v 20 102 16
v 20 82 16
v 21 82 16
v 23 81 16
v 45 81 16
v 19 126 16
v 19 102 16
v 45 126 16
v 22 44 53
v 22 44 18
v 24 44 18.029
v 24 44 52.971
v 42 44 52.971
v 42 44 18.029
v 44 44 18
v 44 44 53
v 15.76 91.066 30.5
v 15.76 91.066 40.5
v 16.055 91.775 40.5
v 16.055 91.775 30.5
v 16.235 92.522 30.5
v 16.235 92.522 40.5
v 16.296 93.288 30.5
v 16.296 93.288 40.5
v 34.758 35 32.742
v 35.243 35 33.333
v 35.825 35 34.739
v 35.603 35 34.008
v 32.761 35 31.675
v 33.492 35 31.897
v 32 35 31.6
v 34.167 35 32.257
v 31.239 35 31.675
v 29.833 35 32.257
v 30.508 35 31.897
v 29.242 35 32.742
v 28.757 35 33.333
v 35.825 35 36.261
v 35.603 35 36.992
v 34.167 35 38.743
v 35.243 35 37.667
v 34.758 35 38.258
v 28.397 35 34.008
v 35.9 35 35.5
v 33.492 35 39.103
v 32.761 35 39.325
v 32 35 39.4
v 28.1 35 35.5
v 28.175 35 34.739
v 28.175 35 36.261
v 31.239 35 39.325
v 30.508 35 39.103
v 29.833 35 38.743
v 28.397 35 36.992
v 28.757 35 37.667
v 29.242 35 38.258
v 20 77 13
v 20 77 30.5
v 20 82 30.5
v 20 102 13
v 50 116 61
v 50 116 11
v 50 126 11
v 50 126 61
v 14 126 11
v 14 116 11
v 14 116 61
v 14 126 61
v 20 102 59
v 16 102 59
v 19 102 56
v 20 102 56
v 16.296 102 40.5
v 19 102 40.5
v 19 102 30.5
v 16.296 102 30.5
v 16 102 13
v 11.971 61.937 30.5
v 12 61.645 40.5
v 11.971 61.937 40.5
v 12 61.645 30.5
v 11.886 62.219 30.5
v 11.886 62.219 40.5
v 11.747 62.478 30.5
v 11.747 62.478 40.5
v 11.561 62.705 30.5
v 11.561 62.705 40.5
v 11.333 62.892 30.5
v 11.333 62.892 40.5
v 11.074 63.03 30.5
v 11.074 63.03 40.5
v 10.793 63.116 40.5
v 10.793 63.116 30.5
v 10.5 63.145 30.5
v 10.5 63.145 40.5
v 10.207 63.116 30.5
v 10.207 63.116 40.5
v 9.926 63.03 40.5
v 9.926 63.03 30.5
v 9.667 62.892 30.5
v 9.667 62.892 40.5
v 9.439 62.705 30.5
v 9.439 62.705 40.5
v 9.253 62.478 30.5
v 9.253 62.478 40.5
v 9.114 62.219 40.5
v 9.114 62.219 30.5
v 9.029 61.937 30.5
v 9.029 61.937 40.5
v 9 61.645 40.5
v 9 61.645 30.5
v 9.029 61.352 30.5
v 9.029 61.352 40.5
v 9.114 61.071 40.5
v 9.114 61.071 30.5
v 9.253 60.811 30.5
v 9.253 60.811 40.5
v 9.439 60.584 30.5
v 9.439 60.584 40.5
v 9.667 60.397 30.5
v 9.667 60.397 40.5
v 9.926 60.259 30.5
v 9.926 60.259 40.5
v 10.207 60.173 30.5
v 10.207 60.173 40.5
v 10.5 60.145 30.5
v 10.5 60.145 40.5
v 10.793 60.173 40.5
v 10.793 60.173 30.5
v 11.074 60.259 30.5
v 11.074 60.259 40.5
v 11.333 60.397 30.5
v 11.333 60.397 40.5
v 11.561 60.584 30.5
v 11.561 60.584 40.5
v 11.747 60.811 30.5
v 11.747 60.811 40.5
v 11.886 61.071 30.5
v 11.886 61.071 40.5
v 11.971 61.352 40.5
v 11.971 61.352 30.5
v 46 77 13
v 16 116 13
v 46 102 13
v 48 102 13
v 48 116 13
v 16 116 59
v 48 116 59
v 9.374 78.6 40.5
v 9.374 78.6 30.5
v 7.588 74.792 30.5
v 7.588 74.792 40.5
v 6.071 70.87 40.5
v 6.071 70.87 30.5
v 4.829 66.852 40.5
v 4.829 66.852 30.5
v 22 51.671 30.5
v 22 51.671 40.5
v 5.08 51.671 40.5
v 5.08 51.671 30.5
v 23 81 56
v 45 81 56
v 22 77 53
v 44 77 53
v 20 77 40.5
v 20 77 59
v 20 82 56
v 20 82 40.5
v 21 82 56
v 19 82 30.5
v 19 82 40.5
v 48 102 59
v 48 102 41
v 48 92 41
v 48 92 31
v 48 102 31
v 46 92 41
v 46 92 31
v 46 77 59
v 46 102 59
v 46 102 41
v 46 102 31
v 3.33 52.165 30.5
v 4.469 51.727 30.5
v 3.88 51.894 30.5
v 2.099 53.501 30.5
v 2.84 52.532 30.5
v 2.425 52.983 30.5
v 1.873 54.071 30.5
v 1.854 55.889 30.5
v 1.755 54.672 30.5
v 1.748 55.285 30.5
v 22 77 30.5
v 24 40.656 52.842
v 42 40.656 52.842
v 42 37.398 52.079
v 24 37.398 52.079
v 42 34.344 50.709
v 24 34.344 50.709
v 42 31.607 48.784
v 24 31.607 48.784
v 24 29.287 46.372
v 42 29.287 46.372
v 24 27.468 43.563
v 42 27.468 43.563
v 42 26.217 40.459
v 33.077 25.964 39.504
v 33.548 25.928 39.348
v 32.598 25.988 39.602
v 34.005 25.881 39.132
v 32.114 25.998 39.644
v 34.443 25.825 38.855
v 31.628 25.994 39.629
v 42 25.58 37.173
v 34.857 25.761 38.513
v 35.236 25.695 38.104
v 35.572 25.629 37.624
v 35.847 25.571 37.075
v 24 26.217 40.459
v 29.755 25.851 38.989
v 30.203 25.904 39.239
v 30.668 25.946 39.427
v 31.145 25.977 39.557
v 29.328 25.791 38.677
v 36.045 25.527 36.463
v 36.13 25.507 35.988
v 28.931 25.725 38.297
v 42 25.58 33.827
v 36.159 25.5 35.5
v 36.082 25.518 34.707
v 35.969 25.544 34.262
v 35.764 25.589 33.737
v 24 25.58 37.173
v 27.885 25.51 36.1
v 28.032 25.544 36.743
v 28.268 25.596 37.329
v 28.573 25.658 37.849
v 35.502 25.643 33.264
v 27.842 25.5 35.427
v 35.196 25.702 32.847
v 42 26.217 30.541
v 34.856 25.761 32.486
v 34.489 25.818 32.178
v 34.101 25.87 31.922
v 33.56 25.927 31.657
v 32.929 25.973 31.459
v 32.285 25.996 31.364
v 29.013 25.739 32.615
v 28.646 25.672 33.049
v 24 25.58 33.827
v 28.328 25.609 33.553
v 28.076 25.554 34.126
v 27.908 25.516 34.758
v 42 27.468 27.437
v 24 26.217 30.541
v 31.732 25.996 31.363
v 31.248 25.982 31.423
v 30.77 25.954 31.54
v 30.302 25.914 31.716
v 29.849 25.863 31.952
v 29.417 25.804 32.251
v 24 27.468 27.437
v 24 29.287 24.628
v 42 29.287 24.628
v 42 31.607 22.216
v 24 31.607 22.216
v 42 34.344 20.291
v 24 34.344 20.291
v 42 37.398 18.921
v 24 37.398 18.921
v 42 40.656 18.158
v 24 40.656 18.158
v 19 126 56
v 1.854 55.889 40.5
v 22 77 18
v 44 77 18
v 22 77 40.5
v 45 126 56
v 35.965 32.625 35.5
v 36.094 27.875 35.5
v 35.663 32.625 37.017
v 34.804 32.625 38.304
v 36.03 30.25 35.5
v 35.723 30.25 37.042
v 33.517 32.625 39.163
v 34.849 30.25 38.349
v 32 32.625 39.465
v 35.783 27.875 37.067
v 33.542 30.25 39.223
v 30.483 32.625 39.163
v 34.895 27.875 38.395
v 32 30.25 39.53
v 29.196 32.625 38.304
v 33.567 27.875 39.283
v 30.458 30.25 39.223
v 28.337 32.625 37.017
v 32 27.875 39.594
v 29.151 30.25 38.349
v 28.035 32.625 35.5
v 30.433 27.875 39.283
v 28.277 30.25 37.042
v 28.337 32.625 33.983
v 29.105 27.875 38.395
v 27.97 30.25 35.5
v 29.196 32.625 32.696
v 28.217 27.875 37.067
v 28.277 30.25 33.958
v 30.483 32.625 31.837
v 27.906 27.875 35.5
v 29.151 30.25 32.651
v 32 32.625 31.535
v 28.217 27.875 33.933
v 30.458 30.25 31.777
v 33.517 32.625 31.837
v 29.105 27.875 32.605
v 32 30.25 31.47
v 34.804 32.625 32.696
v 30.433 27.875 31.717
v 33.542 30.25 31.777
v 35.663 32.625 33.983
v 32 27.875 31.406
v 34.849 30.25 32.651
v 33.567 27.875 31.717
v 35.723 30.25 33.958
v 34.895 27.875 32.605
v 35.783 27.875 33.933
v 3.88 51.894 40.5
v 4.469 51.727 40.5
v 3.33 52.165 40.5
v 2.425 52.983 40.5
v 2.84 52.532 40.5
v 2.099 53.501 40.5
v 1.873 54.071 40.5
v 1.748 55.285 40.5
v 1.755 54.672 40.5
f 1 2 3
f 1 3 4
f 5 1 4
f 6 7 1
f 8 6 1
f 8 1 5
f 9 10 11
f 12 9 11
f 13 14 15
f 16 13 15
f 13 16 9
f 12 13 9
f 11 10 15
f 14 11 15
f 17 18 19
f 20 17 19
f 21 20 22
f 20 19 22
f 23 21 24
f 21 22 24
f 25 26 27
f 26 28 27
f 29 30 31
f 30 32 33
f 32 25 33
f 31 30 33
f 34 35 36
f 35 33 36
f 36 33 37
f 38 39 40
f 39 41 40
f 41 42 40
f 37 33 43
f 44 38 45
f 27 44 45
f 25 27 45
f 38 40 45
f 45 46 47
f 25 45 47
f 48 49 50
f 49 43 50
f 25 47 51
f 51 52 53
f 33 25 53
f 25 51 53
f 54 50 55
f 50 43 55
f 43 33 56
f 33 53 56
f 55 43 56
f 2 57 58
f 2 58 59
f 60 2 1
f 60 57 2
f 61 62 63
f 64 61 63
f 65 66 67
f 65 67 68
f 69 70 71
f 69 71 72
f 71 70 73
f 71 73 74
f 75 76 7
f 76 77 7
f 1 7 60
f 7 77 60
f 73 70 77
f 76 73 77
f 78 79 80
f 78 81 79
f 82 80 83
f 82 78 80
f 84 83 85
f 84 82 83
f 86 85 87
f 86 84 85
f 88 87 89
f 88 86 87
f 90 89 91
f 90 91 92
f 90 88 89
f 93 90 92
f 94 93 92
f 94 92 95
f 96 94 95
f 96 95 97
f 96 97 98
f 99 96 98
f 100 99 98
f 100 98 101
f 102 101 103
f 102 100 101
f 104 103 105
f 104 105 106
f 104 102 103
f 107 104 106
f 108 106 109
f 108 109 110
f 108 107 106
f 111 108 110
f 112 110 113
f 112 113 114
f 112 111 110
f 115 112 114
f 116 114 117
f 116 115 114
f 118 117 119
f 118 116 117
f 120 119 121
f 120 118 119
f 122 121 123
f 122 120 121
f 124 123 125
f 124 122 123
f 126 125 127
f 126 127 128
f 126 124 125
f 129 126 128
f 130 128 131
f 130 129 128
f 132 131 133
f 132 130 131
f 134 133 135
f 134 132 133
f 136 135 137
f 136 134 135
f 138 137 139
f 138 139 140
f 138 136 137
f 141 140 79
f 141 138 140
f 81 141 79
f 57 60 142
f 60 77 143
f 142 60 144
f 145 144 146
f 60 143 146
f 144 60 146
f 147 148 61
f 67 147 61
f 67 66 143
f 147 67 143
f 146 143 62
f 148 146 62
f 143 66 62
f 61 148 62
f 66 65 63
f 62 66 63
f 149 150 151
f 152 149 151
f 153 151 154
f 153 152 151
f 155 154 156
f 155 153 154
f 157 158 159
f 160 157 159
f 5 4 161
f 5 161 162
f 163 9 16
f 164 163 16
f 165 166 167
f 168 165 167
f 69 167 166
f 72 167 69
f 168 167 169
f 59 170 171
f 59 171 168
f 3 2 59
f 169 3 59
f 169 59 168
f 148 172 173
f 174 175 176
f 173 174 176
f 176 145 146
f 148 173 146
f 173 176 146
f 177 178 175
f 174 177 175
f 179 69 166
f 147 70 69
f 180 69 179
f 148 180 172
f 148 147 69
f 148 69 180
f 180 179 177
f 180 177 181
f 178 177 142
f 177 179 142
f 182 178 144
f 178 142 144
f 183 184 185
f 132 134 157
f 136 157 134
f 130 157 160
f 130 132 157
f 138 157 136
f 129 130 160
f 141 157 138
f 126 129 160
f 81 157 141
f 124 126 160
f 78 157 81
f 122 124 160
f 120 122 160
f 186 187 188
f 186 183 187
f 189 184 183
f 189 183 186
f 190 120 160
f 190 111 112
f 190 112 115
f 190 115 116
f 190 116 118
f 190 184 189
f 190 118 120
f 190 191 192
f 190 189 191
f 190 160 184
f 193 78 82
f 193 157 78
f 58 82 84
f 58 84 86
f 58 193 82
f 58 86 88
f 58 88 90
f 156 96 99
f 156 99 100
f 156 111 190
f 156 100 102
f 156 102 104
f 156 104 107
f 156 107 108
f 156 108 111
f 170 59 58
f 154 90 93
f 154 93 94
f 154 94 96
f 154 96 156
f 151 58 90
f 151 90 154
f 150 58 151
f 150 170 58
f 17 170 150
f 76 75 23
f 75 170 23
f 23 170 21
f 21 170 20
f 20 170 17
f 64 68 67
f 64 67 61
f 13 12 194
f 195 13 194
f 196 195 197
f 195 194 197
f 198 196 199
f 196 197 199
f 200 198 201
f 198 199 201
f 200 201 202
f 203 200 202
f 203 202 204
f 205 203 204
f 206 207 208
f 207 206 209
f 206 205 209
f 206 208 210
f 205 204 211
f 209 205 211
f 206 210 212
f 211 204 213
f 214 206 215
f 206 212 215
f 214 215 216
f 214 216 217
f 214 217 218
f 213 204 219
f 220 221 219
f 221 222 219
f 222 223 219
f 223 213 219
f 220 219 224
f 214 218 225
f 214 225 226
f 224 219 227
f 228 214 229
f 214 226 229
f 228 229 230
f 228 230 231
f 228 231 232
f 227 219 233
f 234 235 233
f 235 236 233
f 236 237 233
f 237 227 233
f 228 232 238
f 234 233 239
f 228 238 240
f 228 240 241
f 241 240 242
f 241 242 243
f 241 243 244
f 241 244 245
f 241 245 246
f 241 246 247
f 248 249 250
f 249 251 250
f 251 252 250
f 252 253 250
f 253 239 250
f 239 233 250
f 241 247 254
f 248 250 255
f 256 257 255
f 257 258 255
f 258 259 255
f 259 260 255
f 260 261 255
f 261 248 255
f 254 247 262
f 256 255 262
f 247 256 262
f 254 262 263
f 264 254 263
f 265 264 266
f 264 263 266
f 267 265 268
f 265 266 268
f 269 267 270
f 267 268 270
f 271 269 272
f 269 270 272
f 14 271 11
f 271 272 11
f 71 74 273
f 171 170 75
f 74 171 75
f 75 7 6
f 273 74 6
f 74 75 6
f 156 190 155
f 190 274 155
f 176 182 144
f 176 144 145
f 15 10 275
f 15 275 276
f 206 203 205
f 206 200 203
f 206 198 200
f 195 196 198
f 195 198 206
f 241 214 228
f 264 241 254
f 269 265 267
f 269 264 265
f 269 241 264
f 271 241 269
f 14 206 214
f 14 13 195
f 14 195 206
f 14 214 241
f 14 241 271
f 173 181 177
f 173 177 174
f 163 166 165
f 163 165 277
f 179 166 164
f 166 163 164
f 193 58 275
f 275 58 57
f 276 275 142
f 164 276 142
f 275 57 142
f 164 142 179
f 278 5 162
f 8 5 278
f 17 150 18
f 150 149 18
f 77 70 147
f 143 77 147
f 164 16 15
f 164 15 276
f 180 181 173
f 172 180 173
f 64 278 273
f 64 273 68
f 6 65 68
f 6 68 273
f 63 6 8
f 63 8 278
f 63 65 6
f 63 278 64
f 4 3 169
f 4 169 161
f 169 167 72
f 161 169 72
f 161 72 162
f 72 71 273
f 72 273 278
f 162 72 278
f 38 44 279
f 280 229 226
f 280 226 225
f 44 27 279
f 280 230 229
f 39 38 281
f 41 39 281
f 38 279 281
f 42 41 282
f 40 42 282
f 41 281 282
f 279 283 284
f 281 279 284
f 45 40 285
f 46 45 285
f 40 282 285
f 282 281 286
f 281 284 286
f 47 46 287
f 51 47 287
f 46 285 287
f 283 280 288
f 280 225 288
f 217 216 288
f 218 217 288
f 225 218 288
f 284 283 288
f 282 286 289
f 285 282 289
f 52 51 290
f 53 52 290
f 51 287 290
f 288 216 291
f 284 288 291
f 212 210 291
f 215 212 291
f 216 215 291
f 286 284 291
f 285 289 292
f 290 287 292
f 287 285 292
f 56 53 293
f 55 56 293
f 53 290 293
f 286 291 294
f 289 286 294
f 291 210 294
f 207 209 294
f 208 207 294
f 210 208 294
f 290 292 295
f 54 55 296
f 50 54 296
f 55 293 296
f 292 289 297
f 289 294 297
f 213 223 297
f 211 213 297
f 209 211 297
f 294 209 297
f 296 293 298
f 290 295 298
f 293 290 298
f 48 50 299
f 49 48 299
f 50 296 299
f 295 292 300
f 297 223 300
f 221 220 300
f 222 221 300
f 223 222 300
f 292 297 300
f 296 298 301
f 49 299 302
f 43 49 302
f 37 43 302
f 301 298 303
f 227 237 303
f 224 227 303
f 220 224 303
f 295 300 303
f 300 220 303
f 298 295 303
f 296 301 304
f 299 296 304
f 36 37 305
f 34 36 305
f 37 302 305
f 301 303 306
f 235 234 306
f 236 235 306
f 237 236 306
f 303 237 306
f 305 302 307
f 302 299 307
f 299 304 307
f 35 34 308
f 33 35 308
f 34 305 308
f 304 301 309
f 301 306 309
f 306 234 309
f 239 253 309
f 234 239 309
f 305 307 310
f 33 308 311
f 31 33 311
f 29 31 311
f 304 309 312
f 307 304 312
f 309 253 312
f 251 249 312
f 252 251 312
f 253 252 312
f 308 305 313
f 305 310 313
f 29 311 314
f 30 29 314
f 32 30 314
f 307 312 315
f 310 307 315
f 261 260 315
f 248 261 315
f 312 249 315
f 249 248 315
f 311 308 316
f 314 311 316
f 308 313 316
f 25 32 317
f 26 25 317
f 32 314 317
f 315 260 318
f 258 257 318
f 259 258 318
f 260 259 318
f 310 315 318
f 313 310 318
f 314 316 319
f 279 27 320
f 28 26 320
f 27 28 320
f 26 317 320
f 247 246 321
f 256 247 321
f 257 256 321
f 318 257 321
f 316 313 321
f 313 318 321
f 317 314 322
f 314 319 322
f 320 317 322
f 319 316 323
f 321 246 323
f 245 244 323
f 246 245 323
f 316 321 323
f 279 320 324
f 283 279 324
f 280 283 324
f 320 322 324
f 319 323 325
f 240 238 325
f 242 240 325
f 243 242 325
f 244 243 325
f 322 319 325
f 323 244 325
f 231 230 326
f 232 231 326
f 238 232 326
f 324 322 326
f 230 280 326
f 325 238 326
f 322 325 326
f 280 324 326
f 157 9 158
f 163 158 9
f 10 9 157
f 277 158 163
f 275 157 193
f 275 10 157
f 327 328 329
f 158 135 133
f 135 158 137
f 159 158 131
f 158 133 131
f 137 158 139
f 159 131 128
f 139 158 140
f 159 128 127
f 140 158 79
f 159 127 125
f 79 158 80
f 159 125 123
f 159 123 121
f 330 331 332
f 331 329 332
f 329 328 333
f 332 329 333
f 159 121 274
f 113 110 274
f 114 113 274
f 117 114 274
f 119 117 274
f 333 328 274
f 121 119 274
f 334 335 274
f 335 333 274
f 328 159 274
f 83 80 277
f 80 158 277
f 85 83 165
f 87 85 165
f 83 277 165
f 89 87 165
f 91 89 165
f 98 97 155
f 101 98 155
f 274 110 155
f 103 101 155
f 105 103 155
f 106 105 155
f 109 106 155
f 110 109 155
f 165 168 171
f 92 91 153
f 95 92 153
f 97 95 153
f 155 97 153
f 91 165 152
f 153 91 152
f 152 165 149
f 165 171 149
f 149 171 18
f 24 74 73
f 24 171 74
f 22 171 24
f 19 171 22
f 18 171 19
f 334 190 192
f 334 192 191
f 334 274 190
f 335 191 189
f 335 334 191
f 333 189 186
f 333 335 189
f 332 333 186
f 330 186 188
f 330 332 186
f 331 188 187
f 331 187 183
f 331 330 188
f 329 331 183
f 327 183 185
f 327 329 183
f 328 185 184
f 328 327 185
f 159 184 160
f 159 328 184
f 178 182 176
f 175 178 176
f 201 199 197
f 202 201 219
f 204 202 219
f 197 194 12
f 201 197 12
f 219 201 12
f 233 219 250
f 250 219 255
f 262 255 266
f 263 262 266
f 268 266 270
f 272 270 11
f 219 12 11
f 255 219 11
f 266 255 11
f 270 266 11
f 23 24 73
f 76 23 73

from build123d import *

# Parameters (mm, degrees)
CONE002_ROLL_ANGLE   = 90
BOX005_W             = 26
BOX005_H             = 50
BOX005_DEPTH         = 40
POCKET_DEPTH         = 40.001
BOX001_W             = 32
BOX001_H             = 17
BOX001_DEPTH         = 46
BOX002_W             = 26
BOX002_H             = 12
BOX002_DEPTH         = 10
BOX003_W             = 26
BOX003_H             = 26
BOX003_DEPTH         = 46
BOX004_W             = 22
BOX004_H             = 36
BOX004_DEPTH         = 35
CYLINDER_R           = 17.5
CYLINDER_DEPTH       = 18
CYLINDER_PITCH_ANGLE = 90
SKETCH001_R          = 1.5
PAD_DEPTH            = 4.5
PAD_DEPTH_BACK       = 5.5
BOX_W                = 36
BOX_H                = 10
BOX_DEPTH            = 50


with BuildPart() as beinloch001:
    # Cone002 → Cone002 (revolve)
    with BuildSketch(Plane.XZ):
        Polygon((0, 0), (3.9, 0), (4.2, 11), (0, 11), align=None)
    revolve(axis=Axis((0, 0, 0), (0, 0, 1)))


with BuildPart() as beinloch001_1:
    # Cone002 roll: moved
    add(beinloch001.part.rotate(Axis((0, 0, 0), (1, 0, 0)), CONE002_ROLL_ANGLE))


with BuildPart() as beinloch001_2:
    # Cone002 placement: moved
    add(beinloch001_1.part.moved(Location((32, 35, 35.5))))


with BuildPart() as pocket:
    # Box005 → Box005 (new body)
    with BuildSketch(Plane(origin=(19, 81, 16), x_dir=(1, 0, 0), z_dir=(0, 0, 1))):
        with Locations((13, 25)):
            Rectangle(BOX005_W, BOX005_H)
    extrude(amount=BOX005_DEPTH)

    # Sketch → Pocket (cut, through all)
    with BuildSketch(Plane(origin=(19, 81, 16), x_dir=(1, 0, 0), z_dir=(0, 0, -1))):
        Polygon((0, 0), (0, -1), (2, -1), (4, 0), align=None)
    extrude(amount=-POCKET_DEPTH, mode=Mode.SUBTRACT)


with BuildPart() as stirn:
    # Box001 → Box001 (new body)
    with BuildSketch(Plane(origin=(16, 102, 13), x_dir=(1, 0, 0), z_dir=(0, 0, 1))):
        with Locations((16, 8.5)):
            Rectangle(BOX001_W, BOX001_H)
    extrude(amount=BOX001_DEPTH)


with BuildPart() as gnack:
    # Box002 → Box002 (new body)
    with BuildSketch(Plane(origin=(22, 92, 31), x_dir=(1, 0, 0), z_dir=(0, 0, 1))):
        with Locations((13, 6)):
            Rectangle(BOX002_W, BOX002_H)
    extrude(amount=BOX002_DEPTH)


with BuildPart() as augen:
    # Box003 → Box003 (new body)
    with BuildSketch(Plane(origin=(20, 77, 13), x_dir=(1, 0, 0), z_dir=(0, 0, 1))):
        with Locations((13, 13)):
            Rectangle(BOX003_W, BOX003_H)
    extrude(amount=BOX003_DEPTH)


with BuildPart() as wangen:
    # Box004 → Box004 (new body)
    with BuildSketch(Plane(origin=(22, 44, 18), x_dir=(1, 0, 0), z_dir=(0, 0, 1))):
        with Locations((11, 18)):
            Rectangle(BOX004_W, BOX004_H)
    extrude(amount=BOX004_DEPTH)


with BuildPart() as kinn:
    # Cylinder → Cylinder (new body)
    with BuildSketch(Plane.XY):
        Circle(CYLINDER_R)
    extrude(amount=CYLINDER_DEPTH)


with BuildPart() as kinn_1:
    # Cylinder pitch: moved
    add(kinn.part.rotate(Axis((0, 0, 0), (0, 1, 0)), CYLINDER_PITCH_ANGLE))


with BuildPart() as kinn_2:
    # Cylinder placement: moved
    add(kinn_1.part.moved(Location((24, 43, 35.5))))


with BuildPart() as nase:
    # Sketch001 → Pad (new body, two sides)
    with BuildSketch(Plane(origin=(22, 44, 36), x_dir=(1, 0, 0), z_dir=(0, 0, 1))) as pad_sk:
        with BuildLine():
            Line((1.5, 7.670836), (-16.920451, 7.670836))
            ThreePointArc((-20.14616, 11.888508), (-19.57535, 8.982708), (-16.920451, 7.670836))
            Line((-20.14616, 11.888508), (-17.171201, 22.851854))
            ThreePointArc((-12.625578, 34.600006), (-15.204729, 28.844459), (-17.171201, 22.851854))
            Line((-12.625578, 34.600006), (-6.240143, 47.065773))
            ThreePointArc((-6.240143, 47.065773), (-5.840064, 48.144871), (-5.704179, 49.287696))
            Line((-5.704179, 49.287696), (-5.704179, 58.874008))
            Line((-5.704179, 58.874008), (1.5, 58.874008))
            Line((1.5, 58.874008), (1.5, 7.670836))
        make_face()
        with Locations((-11.5, 17.644535)):
            Circle(SKETCH001_R, mode=Mode.SUBTRACT)
    extrude(amount=PAD_DEPTH)
    extrude(pad_sk.sketch, amount=-PAD_DEPTH_BACK)


with BuildPart() as kopf:
    # Box → Box (new body)
    with BuildSketch(Plane(origin=(14, 116, 11), x_dir=(1, 0, 0), z_dir=(0, 0, 1))):
        with Locations((18, 5)):
            Rectangle(BOX_W, BOX_H)
    extrude(amount=BOX_DEPTH)

    # Fusion: union stirn, gnack, augen, wangen, kinn, nase
    add(stirn.part)
    add(gnack.part)
    add(augen.part)
    add(wangen.part)
    add(kinn_2.part)
    add(nase.part)

    # Cut: cut Pocket
    add(pocket.part, mode=Mode.SUBTRACT)

    # Cut003: cut beinloch001
    add(beinloch001_2.part, mode=Mode.SUBTRACT)


solid = kopf.part
